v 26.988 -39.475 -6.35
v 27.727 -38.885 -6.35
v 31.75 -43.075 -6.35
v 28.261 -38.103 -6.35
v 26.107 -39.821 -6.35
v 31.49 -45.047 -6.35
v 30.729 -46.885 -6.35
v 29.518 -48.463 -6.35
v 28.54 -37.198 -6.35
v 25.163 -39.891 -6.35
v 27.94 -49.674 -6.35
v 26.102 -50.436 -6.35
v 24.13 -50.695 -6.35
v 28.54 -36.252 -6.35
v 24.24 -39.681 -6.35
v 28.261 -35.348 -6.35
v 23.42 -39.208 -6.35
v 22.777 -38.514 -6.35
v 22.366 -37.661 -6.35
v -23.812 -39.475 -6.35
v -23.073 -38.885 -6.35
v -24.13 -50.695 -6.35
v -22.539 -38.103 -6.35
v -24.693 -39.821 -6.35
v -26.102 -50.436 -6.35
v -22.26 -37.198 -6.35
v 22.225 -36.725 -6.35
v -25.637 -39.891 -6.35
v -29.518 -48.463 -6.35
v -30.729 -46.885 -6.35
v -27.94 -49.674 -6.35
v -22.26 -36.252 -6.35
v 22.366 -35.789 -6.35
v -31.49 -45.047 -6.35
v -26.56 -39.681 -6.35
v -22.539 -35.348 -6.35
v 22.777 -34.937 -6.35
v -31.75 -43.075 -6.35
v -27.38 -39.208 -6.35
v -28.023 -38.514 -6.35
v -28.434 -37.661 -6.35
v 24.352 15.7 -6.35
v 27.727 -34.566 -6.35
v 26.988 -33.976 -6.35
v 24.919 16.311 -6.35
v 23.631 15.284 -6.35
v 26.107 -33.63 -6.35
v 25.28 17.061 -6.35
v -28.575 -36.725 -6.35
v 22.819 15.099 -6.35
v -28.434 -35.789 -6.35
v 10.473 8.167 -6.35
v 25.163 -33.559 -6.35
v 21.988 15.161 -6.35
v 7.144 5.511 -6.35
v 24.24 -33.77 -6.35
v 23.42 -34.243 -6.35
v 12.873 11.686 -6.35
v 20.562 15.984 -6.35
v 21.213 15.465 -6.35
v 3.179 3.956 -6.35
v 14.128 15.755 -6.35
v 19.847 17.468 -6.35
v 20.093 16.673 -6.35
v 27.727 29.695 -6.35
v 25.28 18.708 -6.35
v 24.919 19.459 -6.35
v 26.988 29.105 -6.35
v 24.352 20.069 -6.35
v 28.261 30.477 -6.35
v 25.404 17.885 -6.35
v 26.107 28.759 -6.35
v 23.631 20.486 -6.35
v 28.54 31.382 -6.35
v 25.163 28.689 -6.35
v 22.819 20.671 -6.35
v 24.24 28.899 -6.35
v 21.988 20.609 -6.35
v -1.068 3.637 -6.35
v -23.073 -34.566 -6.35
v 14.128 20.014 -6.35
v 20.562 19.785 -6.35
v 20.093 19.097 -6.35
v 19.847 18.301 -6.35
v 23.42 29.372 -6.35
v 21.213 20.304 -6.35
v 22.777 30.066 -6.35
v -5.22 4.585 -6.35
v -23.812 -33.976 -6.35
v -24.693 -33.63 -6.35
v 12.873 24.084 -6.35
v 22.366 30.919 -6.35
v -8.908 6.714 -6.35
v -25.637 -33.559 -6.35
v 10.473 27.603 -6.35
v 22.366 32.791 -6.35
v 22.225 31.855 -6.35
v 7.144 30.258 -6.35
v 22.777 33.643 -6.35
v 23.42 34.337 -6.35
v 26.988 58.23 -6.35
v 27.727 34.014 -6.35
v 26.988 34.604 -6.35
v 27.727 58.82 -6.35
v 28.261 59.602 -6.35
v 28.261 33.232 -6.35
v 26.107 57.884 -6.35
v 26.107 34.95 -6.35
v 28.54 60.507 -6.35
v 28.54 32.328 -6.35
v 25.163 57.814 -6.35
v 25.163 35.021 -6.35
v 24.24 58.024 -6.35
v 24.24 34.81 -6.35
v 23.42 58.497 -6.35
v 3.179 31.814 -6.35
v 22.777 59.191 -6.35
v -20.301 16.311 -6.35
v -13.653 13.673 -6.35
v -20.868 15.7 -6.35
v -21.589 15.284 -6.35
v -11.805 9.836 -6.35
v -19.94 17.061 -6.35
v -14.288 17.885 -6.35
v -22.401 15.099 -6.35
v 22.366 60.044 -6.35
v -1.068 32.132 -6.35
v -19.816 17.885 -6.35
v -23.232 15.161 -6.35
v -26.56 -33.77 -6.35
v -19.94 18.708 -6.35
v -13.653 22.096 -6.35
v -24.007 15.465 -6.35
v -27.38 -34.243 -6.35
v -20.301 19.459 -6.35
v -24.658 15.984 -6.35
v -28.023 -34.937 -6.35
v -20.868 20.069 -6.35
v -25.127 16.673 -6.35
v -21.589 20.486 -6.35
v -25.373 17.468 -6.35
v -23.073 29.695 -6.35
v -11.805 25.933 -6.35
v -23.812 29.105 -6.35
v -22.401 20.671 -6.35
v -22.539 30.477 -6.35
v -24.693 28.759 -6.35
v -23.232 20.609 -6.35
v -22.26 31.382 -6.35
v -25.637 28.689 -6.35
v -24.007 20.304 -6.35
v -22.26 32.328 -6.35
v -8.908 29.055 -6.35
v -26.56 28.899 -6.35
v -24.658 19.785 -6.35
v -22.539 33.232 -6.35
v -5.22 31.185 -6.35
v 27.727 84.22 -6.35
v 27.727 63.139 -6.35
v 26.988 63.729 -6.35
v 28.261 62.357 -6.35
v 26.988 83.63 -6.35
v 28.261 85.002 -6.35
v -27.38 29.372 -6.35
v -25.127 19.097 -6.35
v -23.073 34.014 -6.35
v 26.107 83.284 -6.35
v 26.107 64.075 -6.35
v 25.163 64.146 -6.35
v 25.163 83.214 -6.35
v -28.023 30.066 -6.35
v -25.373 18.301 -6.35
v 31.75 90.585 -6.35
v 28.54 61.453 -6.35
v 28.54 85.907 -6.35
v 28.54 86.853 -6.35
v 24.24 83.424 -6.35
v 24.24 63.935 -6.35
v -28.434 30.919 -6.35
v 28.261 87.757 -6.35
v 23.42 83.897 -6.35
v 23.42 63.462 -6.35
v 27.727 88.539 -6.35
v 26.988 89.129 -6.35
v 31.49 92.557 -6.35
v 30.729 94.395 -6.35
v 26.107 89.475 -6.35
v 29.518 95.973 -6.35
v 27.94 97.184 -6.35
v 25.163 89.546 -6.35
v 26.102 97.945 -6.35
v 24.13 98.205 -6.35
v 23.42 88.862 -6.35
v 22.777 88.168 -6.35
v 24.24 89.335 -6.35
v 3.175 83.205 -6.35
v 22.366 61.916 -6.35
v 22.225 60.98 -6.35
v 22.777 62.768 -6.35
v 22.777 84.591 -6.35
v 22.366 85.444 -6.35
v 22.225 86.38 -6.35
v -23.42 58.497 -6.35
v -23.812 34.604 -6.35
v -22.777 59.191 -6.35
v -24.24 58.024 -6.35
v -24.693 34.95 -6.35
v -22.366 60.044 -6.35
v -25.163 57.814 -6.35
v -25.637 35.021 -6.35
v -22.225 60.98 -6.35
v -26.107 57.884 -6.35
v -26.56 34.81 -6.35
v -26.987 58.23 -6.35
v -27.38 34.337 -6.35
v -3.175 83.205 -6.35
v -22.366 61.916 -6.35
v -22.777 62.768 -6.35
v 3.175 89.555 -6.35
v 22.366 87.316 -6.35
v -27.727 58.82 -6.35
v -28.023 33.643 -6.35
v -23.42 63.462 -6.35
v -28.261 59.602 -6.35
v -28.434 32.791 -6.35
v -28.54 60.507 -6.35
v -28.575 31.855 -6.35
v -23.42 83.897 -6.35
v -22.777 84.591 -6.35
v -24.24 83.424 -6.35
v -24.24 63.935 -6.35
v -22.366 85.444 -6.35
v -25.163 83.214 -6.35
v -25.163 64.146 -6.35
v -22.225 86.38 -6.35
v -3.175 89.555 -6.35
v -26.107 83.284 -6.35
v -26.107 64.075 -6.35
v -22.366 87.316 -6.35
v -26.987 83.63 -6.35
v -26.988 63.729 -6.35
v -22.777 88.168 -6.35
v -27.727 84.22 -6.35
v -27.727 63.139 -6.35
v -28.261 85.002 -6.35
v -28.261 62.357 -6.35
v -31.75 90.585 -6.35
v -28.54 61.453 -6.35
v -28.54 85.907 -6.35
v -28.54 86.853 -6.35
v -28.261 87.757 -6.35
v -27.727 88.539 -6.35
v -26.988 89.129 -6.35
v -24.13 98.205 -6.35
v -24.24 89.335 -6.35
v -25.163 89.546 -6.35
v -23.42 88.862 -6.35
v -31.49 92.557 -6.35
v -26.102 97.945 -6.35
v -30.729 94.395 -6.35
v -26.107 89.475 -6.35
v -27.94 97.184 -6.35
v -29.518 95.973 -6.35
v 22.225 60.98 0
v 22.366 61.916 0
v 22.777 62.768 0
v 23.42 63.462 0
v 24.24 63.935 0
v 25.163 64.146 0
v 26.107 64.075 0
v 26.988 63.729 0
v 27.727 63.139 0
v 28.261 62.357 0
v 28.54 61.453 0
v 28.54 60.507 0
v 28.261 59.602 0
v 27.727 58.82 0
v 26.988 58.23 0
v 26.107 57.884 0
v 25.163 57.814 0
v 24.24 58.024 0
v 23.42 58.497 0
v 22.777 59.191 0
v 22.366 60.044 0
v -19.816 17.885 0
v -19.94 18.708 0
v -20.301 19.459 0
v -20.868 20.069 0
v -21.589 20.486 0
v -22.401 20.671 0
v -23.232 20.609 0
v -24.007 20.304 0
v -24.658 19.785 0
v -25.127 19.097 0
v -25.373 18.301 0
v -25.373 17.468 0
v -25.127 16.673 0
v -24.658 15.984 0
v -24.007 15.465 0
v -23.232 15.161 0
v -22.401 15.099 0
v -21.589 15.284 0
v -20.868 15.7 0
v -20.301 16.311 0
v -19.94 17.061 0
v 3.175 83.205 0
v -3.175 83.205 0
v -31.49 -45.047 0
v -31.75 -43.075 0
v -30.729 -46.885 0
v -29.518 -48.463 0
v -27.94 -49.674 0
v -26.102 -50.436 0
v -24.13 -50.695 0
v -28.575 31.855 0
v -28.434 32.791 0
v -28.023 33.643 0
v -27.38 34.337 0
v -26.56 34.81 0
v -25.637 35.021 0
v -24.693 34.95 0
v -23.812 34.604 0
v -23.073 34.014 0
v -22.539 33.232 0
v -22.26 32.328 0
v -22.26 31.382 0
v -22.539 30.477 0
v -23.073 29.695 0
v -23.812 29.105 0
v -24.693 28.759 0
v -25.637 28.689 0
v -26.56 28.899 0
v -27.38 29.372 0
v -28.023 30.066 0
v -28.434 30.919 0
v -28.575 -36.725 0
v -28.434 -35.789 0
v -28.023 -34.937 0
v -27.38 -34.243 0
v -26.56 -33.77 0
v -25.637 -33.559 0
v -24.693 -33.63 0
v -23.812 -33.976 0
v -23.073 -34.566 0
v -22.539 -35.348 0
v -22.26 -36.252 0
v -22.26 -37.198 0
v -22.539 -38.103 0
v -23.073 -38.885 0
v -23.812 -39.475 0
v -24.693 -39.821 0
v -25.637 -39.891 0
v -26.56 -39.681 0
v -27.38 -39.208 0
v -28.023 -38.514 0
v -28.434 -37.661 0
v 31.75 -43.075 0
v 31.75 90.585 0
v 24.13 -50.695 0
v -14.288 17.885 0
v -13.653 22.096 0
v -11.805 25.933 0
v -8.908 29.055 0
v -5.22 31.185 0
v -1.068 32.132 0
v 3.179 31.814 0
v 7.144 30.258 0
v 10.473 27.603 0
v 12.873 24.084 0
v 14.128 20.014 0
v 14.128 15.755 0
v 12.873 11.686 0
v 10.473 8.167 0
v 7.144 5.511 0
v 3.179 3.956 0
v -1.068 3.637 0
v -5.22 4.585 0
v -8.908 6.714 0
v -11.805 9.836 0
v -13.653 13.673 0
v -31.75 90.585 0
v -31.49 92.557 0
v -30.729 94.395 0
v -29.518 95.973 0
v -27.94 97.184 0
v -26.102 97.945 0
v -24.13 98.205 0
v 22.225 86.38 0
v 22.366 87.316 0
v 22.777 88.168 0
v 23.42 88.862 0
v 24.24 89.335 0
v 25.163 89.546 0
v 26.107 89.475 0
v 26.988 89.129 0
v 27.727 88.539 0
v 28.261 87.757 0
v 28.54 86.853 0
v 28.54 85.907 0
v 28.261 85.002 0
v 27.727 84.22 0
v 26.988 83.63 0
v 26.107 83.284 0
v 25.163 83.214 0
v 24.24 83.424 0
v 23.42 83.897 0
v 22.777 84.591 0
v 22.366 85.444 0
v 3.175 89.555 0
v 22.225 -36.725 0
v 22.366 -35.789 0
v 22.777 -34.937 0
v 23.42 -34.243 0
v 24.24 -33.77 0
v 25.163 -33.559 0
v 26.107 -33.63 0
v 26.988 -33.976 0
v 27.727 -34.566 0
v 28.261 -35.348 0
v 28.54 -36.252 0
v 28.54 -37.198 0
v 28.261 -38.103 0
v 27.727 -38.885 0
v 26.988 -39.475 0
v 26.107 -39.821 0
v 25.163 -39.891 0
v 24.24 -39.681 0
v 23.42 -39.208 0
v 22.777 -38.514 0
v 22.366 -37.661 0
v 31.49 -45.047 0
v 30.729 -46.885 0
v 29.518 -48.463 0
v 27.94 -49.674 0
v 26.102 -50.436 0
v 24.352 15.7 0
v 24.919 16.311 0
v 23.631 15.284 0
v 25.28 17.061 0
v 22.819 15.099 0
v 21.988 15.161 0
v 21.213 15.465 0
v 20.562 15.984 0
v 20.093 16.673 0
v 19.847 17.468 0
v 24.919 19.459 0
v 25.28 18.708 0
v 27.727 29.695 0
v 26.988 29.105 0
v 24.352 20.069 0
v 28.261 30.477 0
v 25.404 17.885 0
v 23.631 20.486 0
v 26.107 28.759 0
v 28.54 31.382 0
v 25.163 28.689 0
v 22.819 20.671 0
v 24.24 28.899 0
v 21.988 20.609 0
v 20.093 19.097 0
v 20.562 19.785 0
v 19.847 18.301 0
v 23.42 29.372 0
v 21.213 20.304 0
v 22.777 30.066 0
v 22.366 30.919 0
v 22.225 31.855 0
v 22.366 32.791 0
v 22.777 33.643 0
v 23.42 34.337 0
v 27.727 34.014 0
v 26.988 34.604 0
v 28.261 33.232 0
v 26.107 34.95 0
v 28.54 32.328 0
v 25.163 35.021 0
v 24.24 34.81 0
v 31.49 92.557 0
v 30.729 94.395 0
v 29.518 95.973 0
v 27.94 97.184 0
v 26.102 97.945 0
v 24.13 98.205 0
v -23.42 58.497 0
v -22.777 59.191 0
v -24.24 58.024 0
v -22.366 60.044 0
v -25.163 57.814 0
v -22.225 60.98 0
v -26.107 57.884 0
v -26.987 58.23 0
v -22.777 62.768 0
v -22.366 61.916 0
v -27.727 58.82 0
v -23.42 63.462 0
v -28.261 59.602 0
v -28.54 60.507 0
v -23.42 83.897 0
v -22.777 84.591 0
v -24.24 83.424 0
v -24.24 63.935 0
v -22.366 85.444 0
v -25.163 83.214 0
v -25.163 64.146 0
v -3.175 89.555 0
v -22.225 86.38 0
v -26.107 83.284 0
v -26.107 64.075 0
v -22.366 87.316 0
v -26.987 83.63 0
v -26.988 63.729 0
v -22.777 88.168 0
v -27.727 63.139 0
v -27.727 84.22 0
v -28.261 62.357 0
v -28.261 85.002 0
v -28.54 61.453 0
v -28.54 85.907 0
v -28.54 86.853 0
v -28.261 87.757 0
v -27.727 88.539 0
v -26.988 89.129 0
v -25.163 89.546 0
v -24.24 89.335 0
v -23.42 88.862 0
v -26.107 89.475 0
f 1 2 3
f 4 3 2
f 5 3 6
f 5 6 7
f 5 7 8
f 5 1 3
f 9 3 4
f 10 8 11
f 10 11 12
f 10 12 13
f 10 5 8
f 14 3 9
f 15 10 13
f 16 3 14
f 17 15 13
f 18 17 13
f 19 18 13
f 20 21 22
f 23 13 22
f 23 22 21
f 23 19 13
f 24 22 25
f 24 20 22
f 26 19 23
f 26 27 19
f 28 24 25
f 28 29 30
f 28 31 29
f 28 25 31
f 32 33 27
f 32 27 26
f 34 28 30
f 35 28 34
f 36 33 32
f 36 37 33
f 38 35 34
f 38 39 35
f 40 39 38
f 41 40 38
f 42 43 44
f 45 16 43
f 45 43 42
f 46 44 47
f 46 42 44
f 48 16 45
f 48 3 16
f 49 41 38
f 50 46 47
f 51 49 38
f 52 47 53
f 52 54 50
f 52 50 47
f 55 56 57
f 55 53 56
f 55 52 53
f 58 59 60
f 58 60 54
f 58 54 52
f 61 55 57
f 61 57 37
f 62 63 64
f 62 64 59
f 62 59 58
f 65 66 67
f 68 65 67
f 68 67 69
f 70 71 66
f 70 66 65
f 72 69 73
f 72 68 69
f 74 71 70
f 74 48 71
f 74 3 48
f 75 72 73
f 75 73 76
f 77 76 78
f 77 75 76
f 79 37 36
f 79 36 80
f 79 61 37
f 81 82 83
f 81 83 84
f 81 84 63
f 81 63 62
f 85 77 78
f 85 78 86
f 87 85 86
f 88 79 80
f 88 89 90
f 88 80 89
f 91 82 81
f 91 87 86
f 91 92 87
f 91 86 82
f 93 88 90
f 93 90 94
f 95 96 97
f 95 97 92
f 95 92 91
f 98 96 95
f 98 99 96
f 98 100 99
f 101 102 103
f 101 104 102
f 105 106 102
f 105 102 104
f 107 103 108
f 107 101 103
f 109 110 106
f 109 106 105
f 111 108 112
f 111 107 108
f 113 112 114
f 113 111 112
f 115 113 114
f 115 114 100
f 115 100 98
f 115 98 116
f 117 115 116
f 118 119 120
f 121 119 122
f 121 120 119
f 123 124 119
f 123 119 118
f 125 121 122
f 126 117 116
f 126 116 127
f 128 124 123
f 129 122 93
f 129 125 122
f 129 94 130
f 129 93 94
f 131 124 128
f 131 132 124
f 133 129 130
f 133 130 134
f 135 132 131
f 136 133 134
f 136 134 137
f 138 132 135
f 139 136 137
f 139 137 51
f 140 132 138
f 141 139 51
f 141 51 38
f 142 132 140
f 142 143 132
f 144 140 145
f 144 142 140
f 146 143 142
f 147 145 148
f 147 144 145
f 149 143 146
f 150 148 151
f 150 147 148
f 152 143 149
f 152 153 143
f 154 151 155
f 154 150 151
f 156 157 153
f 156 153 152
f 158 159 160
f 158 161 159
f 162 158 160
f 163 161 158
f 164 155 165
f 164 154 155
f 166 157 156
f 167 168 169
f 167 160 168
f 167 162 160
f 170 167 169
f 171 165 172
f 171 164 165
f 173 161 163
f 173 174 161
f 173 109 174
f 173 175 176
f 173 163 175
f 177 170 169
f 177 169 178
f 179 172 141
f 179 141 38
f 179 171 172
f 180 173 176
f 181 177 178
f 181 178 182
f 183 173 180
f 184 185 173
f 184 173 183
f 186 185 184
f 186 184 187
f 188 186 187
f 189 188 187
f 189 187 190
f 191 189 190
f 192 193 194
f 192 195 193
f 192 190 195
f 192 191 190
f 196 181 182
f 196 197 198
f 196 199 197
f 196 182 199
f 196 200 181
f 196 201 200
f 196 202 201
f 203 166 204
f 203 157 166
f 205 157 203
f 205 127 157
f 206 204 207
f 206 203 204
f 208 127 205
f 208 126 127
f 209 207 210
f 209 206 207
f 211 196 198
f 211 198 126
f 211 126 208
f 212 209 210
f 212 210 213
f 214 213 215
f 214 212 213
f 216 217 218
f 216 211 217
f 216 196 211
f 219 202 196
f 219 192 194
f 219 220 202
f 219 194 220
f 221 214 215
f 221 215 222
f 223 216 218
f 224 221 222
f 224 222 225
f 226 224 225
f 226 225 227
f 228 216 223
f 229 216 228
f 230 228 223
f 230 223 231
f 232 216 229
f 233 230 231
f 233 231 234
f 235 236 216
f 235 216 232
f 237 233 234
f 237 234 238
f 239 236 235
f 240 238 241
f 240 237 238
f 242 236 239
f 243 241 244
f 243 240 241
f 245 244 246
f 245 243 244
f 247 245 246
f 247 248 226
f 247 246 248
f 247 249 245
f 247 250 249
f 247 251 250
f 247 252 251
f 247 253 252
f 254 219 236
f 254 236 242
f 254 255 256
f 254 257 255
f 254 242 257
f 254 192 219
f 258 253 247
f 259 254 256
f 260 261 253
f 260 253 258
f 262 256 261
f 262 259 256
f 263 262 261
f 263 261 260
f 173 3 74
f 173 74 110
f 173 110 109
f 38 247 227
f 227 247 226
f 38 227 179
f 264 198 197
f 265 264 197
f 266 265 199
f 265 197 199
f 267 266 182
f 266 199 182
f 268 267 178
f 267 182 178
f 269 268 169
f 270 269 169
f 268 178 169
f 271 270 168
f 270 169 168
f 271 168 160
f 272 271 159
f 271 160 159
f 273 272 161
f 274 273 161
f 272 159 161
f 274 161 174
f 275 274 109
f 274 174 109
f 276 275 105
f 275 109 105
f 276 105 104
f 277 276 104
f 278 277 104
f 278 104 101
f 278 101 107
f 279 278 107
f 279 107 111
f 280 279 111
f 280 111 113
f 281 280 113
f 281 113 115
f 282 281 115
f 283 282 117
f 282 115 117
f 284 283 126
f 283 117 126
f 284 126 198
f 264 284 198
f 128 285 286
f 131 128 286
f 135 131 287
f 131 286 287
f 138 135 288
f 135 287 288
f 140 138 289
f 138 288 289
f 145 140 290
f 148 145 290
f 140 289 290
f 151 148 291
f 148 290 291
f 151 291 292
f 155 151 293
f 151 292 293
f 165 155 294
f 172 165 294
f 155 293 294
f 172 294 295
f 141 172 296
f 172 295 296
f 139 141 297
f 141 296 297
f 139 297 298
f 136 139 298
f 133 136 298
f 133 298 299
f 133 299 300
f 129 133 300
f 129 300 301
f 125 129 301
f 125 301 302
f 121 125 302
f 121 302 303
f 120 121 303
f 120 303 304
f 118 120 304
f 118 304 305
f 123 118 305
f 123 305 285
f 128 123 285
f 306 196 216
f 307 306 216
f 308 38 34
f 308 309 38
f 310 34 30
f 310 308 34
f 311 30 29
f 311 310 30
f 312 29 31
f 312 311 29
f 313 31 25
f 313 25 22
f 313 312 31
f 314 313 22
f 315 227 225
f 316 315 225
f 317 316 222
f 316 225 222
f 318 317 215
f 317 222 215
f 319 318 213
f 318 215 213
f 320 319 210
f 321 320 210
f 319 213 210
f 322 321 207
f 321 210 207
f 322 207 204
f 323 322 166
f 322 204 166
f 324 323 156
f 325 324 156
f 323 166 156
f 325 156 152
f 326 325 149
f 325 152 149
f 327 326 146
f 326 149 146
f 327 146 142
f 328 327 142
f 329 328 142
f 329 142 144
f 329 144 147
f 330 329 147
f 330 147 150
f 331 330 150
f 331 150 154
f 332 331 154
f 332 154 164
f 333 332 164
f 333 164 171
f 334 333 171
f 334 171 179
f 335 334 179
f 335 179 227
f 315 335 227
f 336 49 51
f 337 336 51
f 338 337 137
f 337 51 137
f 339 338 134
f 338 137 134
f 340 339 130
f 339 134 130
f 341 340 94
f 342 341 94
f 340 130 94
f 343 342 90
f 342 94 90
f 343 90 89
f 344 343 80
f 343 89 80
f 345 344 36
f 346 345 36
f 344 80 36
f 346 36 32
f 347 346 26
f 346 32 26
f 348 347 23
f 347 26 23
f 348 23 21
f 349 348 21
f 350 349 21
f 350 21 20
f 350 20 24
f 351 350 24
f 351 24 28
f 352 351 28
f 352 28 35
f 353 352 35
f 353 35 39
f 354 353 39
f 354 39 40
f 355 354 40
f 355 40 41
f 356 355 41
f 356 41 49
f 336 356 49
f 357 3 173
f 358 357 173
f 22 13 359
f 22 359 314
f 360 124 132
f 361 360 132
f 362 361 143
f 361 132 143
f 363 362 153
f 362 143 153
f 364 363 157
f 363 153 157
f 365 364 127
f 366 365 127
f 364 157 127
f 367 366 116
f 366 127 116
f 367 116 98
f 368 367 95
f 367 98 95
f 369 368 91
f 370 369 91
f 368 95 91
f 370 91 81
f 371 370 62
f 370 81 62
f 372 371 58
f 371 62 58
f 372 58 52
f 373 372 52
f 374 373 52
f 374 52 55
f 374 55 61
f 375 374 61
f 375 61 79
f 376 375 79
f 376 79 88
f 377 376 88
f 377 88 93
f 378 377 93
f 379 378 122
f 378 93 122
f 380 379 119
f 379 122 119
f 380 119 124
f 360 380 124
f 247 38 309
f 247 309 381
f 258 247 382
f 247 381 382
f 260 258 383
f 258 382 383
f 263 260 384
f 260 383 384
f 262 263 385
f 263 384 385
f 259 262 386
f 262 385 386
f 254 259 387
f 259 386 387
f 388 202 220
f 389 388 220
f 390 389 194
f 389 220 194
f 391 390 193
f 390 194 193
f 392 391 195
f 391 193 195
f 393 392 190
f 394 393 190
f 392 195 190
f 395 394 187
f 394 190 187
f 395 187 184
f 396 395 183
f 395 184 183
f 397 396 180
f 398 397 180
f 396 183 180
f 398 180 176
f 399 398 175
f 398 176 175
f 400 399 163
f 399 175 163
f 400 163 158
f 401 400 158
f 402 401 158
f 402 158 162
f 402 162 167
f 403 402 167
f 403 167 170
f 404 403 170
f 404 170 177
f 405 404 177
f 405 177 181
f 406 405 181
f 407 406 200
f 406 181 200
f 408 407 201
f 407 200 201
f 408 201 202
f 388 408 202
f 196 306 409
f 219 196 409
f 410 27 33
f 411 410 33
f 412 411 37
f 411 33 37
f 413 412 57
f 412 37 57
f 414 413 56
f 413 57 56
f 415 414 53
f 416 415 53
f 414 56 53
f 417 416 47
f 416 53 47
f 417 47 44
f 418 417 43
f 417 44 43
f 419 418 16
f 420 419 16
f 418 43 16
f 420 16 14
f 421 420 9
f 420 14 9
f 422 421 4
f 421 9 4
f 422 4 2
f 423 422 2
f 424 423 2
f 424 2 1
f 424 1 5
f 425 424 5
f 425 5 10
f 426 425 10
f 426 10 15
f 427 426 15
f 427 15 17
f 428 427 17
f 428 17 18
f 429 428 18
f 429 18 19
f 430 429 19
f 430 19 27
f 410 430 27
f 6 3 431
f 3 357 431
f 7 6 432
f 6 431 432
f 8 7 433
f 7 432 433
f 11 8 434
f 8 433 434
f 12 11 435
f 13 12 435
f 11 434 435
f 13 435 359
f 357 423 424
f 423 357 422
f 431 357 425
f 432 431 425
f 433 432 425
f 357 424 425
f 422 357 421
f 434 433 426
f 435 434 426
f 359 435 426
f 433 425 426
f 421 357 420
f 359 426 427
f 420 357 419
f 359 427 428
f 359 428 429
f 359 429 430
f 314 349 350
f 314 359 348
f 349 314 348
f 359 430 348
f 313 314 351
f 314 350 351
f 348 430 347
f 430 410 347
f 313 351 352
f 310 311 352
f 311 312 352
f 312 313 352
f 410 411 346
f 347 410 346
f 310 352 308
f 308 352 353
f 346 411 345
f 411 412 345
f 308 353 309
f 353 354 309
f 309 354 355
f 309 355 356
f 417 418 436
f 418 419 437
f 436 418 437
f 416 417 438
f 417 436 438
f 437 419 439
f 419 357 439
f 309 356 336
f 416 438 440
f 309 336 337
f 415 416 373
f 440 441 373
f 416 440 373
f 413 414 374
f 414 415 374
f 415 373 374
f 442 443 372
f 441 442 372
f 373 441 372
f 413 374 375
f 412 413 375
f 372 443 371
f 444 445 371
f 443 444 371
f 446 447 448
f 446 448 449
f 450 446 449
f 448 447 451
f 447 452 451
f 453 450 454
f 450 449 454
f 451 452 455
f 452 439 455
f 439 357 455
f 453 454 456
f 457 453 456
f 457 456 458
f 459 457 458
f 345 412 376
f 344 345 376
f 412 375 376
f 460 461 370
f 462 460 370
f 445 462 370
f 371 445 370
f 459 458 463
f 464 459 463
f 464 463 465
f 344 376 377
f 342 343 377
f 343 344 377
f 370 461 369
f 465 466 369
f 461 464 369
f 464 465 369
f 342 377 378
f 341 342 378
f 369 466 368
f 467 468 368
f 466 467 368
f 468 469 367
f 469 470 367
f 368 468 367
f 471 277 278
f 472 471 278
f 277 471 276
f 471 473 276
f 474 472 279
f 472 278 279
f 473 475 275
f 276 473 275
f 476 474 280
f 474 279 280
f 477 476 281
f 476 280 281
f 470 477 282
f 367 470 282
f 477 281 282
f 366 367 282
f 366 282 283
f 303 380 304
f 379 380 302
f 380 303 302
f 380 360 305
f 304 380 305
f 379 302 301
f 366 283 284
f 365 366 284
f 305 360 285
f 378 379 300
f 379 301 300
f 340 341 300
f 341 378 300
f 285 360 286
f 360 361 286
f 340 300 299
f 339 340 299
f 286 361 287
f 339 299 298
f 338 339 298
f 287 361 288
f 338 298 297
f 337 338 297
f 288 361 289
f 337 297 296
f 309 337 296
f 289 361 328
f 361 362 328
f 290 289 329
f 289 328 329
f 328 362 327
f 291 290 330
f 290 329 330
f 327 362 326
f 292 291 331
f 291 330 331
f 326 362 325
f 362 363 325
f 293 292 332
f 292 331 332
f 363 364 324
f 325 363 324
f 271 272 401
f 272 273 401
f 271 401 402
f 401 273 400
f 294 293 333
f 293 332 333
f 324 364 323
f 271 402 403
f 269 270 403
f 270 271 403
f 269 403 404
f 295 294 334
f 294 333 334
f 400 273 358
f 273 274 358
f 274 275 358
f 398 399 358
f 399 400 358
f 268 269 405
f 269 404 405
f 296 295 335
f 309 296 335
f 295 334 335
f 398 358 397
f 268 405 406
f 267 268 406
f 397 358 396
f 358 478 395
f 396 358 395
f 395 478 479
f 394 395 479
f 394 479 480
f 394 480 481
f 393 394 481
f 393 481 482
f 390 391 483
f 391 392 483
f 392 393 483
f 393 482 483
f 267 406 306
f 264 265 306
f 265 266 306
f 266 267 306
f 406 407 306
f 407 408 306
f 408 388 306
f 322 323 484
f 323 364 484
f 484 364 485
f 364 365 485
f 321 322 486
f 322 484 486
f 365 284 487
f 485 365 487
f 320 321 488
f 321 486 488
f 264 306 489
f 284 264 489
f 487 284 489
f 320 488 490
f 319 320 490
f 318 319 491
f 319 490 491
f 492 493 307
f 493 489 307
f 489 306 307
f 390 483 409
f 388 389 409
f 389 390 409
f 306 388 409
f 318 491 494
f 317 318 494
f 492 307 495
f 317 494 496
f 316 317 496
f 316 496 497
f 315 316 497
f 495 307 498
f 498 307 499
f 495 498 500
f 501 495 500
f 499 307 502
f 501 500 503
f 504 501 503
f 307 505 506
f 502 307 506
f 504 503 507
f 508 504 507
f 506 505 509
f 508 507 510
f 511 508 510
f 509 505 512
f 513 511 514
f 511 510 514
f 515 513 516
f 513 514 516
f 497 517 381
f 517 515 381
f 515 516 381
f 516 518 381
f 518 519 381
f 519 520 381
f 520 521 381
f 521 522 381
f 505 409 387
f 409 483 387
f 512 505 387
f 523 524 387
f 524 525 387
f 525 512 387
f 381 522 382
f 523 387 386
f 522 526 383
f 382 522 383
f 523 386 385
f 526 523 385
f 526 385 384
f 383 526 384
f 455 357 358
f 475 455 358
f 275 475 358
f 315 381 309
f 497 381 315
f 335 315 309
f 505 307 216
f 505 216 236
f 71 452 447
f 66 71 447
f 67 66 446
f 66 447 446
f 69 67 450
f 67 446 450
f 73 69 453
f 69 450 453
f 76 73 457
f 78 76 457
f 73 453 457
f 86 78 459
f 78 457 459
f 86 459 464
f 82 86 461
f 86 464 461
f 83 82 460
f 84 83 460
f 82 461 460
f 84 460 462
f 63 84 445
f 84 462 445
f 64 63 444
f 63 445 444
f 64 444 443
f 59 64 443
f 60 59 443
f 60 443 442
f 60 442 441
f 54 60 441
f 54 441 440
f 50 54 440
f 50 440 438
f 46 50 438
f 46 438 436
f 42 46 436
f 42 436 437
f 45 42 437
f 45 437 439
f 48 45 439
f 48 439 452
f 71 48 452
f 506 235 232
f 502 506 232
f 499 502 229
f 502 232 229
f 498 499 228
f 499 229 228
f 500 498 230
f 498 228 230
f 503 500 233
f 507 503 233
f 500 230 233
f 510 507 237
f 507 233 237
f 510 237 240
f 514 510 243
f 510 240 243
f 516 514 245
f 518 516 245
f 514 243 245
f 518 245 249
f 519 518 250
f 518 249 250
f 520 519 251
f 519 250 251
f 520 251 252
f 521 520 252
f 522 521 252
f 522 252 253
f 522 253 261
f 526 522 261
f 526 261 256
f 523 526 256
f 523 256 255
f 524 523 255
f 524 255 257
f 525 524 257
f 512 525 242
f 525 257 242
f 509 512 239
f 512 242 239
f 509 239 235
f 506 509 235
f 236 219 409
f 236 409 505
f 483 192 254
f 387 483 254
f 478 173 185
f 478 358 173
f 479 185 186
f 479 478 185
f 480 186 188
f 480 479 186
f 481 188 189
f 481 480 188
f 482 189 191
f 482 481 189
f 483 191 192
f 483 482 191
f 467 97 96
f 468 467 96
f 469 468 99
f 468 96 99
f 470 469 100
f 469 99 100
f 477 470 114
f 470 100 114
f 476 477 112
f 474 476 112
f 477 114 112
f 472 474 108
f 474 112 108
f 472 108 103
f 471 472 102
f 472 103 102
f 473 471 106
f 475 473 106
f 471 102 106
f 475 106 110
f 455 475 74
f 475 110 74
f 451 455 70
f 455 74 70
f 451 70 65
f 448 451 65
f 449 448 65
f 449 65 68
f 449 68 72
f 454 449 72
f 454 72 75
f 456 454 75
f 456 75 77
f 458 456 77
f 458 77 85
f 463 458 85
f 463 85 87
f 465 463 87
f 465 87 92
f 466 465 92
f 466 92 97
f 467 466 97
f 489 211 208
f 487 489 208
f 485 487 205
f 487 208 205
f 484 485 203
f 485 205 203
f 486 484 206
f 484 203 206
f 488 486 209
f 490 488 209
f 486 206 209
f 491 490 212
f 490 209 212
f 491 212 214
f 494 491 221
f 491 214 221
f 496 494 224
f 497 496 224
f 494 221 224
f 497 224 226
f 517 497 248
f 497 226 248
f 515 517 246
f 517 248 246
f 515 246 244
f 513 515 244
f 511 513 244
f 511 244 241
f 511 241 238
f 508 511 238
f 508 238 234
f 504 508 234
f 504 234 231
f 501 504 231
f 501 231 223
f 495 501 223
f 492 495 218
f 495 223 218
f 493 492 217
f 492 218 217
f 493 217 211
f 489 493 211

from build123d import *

# Parameters (mm, degrees)
BOSS_EXTRUDE1_DEPTH = 6.35
SKETCH2_R           = 1.35
SKETCH2_R_2         = 1.385
CUT_EXTRUDE1_DEPTH  = 38.116505762
SKETCH3_W           = 63.5
SKETCH3_H           = 88.9
SKETCH3_W_2         = 38.321076004
SKETCH3_H_2         = 47.237540142
BOSS_EXTRUDE2_DEPTH = 6.35
SKETCH5_W           = 27.94
SKETCH5_H           = 55.88
CUT_EXTRUDE3_DEPTH  = 61.153053743
SKETCH6_R           = 3.175
CUT_EXTRUDE4_DEPTH  = 61.153053743
SKETCH7_W           = 41.724968974
SKETCH7_H           = 57.858351452
BOSS_EXTRUDE3_DEPTH = 6.35
SKETCH8_R           = 14.2875
CUT_EXTRUDE5_DEPTH  = 6.35
SKETCH10_W          = 63.5
SKETCH10_H          = 60
SKETCH10_R          = 3.175
SKETCH10_W_2        = 6.35
SKETCH10_H_2        = 6.35
BOSS_EXTRUDE4_DEPTH = 6.35
FILLET1_R           = 7.62
SKETCH11_R          = 2.794
CUT_EXTRUDE6_DEPTH  = 104.404858197


with BuildPart() as part:
    # Sketch1 → Boss-Extrude1 (new body)
    with BuildSketch(Plane.XY):
        with BuildLine():
            Line((-19.69889026, 23.2987845), (-14.850045261, 29.75147823))
            ThreePointArc((-14.850045261, 29.75147823), (-14.144755454, 30.339267512), (-13.251155001, 30.55))
            Line((-13.251155001, 30.55), (13.251155001, 30.55))
            ThreePointArc((13.251155001, 30.55), (14.144755454, 30.339267512), (14.850045261, 29.75147823))
            Line((14.850045261, 29.75147823), (19.69889026, 23.2987845))
            ThreePointArc((19.69889026, 23.2987845), (19.997074131, 22.730638521), (20.1, 22.09730627))
            Line((20.1, 22.09730627), (20.1, -22.09730627))
            ThreePointArc((20.1, -22.09730627), (19.997074131, -22.730638521), (19.69889026, -23.2987845))
            Line((19.69889026, -23.2987845), (14.850045261, -29.75147823))
            ThreePointArc((14.850045261, -29.75147823), (14.144755454, -30.339267512), (13.251155001, -30.55))
            Line((13.251155001, -30.55), (-13.251155001, -30.55))
            ThreePointArc((-13.251155001, -30.55), (-14.144755454, -30.339267512), (-14.850045261, -29.75147823))
            Line((-14.850045261, -29.75147823), (-19.69889026, -23.2987845))
            ThreePointArc((-19.69889026, -23.2987845), (-19.997074131, -22.730638521), (-20.1, -22.09730627))
            Line((-20.1, -22.09730627), (-20.1, 22.09730627))
            ThreePointArc((-20.1, 22.09730627), (-19.997074131, 22.730638521), (-19.69889026, 23.2987845))
        make_face()
    extrude(amount=-BOSS_EXTRUDE1_DEPTH)

    # Sketch2 → Cut-Extrude1 (cut, through all)
    with BuildSketch(Plane(origin=(0, 0, -6.35), x_dir=(-1, 0, 0), z_dir=(0, 0, -1))):
        with Locations((17.3, 21.9487845)):
            Circle(SKETCH2_R)
        with Locations((17.3, -0.0512155)):
            Circle(SKETCH2_R)
        with Locations((17.3, -22.0512155)):
            Circle(SKETCH2_R)
        with Locations((11, -27.75)):
            Circle(SKETCH2_R_2)
        with Locations(Location((-11, -27.75, 0), (0, 0, 180))):
            Circle(SKETCH2_R_2)
        with Locations(Location((-17.3, -22.0512155, 0), (0, 0, 180))):
            Circle(SKETCH2_R)
        with Locations(Location((-17.3, -0.0512155, 0), (0, 0, 180))):
            Circle(SKETCH2_R)
        with Locations(Location((-17.3, 21.9487845, 0), (0, 0, 180))):
            Circle(SKETCH2_R)
    extrude(amount=-CUT_EXTRUDE1_DEPTH, mode=Mode.SUBTRACT)

    # Sketch3 → Boss-Extrude2 (add)
    with BuildSketch(Plane(origin=(0, 0, -6.35), x_dir=(-1, 0, 0), z_dir=(0, 0, -1))):
        with Locations((0, -6.2452155)):
            Rectangle(SKETCH3_W, SKETCH3_H)
        Rectangle(SKETCH3_W_2, SKETCH3_H_2, mode=Mode.SUBTRACT)
    extrude(amount=-BOSS_EXTRUDE2_DEPTH)

    # Sketch5 → Cut-Extrude3 (cut, through all)
    with BuildSketch(Plane.XY):
        with Locations((0, 3.0087845)):
            Rectangle(SKETCH5_W, SKETCH5_H)
    extrude(amount=-CUT_EXTRUDE3_DEPTH, mode=Mode.SUBTRACT)

    # Sketch6 → Cut-Extrude4 (cut, through all)
    with BuildSketch(Plane(origin=(0, 0, -6.35), x_dir=(-1, 0, 0), z_dir=(0, 0, -1))):
        with Locations((25.4, 31.8547845)):
            Circle(SKETCH6_R)
        with Locations((-25.4, 31.8547845)):
            Circle(SKETCH6_R)
        with Locations((-25.4, -36.7252155)):
            Circle(SKETCH6_R)
        with Locations((25.4, -36.7252155)):
            Circle(SKETCH6_R)
    extrude(amount=-CUT_EXTRUDE4_DEPTH, mode=Mode.SUBTRACT)

    # Sketch7 → Boss-Extrude3 (add)
    with BuildSketch(Plane(origin=(0, 0, -6.35), x_dir=(-1, 0, 0), z_dir=(0, 0, -1))):
        with Locations((0, 3.16744248)):
            Rectangle(SKETCH7_W, SKETCH7_H)
    extrude(amount=-BOSS_EXTRUDE3_DEPTH)

    # Sketch8 → Cut-Extrude5 (cut)
    with BuildSketch(Plane(origin=(0, 0, -6.35), x_dir=(-1, 0, 0), z_dir=(0, 0, -1))):
        with Locations((0, 17.8847845)):
            Circle(SKETCH8_R)
    extrude(amount=-CUT_EXTRUDE5_DEPTH, mode=Mode.SUBTRACT)

    # Sketch10 → Boss-Extrude4 (add)
    with BuildSketch(Plane(origin=(0, 0, -6.35), x_dir=(-1, 0, 0), z_dir=(0, 0, -1))):
        with Locations((0, 68.2047845)):
            Rectangle(SKETCH10_W, SKETCH10_H)
        with Locations((-25.4, 86.3797845)):
            Circle(SKETCH10_R, mode=Mode.SUBTRACT)
        with Locations((-25.4, 60.9797845)):
            Circle(SKETCH10_R, mode=Mode.SUBTRACT)
        with Locations(Location((25.4, 60.9797845, 0), (0, 0, 180))):
            Circle(SKETCH10_R, mode=Mode.SUBTRACT)
        with Locations(Location((25.4, 86.3797845, 0), (0, 0, 180))):
            Circle(SKETCH10_R, mode=Mode.SUBTRACT)
        with Locations((0, 86.3797845)):
            Rectangle(SKETCH10_W_2, SKETCH10_H_2, mode=Mode.SUBTRACT)
    extrude(amount=-BOSS_EXTRUDE4_DEPTH)

    # Fillet1
    fillet1_edges = [part.edges().sort_by_distance(p)[0] for p in [
        (31.75, 98.2047845, -3.175),
        (-31.75, 98.2047845, -3.175),
        (-31.75, -50.6952155, -3.175),
        (31.75, -50.6952155, -3.175),
    ]]
    fillet(fillet1_edges, radius=FILLET1_R)

    # Sketch11 → Cut-Extrude6 (cut, through all)
    with BuildSketch(Plane.XY):
        with Locations((-22.61, 17.8847845)):
            Circle(SKETCH11_R)
        with Locations((22.61, 17.8847845)):
            Circle(SKETCH11_R)
    extrude(amount=-CUT_EXTRUDE6_DEPTH, mode=Mode.SUBTRACT)


solid = part.part
